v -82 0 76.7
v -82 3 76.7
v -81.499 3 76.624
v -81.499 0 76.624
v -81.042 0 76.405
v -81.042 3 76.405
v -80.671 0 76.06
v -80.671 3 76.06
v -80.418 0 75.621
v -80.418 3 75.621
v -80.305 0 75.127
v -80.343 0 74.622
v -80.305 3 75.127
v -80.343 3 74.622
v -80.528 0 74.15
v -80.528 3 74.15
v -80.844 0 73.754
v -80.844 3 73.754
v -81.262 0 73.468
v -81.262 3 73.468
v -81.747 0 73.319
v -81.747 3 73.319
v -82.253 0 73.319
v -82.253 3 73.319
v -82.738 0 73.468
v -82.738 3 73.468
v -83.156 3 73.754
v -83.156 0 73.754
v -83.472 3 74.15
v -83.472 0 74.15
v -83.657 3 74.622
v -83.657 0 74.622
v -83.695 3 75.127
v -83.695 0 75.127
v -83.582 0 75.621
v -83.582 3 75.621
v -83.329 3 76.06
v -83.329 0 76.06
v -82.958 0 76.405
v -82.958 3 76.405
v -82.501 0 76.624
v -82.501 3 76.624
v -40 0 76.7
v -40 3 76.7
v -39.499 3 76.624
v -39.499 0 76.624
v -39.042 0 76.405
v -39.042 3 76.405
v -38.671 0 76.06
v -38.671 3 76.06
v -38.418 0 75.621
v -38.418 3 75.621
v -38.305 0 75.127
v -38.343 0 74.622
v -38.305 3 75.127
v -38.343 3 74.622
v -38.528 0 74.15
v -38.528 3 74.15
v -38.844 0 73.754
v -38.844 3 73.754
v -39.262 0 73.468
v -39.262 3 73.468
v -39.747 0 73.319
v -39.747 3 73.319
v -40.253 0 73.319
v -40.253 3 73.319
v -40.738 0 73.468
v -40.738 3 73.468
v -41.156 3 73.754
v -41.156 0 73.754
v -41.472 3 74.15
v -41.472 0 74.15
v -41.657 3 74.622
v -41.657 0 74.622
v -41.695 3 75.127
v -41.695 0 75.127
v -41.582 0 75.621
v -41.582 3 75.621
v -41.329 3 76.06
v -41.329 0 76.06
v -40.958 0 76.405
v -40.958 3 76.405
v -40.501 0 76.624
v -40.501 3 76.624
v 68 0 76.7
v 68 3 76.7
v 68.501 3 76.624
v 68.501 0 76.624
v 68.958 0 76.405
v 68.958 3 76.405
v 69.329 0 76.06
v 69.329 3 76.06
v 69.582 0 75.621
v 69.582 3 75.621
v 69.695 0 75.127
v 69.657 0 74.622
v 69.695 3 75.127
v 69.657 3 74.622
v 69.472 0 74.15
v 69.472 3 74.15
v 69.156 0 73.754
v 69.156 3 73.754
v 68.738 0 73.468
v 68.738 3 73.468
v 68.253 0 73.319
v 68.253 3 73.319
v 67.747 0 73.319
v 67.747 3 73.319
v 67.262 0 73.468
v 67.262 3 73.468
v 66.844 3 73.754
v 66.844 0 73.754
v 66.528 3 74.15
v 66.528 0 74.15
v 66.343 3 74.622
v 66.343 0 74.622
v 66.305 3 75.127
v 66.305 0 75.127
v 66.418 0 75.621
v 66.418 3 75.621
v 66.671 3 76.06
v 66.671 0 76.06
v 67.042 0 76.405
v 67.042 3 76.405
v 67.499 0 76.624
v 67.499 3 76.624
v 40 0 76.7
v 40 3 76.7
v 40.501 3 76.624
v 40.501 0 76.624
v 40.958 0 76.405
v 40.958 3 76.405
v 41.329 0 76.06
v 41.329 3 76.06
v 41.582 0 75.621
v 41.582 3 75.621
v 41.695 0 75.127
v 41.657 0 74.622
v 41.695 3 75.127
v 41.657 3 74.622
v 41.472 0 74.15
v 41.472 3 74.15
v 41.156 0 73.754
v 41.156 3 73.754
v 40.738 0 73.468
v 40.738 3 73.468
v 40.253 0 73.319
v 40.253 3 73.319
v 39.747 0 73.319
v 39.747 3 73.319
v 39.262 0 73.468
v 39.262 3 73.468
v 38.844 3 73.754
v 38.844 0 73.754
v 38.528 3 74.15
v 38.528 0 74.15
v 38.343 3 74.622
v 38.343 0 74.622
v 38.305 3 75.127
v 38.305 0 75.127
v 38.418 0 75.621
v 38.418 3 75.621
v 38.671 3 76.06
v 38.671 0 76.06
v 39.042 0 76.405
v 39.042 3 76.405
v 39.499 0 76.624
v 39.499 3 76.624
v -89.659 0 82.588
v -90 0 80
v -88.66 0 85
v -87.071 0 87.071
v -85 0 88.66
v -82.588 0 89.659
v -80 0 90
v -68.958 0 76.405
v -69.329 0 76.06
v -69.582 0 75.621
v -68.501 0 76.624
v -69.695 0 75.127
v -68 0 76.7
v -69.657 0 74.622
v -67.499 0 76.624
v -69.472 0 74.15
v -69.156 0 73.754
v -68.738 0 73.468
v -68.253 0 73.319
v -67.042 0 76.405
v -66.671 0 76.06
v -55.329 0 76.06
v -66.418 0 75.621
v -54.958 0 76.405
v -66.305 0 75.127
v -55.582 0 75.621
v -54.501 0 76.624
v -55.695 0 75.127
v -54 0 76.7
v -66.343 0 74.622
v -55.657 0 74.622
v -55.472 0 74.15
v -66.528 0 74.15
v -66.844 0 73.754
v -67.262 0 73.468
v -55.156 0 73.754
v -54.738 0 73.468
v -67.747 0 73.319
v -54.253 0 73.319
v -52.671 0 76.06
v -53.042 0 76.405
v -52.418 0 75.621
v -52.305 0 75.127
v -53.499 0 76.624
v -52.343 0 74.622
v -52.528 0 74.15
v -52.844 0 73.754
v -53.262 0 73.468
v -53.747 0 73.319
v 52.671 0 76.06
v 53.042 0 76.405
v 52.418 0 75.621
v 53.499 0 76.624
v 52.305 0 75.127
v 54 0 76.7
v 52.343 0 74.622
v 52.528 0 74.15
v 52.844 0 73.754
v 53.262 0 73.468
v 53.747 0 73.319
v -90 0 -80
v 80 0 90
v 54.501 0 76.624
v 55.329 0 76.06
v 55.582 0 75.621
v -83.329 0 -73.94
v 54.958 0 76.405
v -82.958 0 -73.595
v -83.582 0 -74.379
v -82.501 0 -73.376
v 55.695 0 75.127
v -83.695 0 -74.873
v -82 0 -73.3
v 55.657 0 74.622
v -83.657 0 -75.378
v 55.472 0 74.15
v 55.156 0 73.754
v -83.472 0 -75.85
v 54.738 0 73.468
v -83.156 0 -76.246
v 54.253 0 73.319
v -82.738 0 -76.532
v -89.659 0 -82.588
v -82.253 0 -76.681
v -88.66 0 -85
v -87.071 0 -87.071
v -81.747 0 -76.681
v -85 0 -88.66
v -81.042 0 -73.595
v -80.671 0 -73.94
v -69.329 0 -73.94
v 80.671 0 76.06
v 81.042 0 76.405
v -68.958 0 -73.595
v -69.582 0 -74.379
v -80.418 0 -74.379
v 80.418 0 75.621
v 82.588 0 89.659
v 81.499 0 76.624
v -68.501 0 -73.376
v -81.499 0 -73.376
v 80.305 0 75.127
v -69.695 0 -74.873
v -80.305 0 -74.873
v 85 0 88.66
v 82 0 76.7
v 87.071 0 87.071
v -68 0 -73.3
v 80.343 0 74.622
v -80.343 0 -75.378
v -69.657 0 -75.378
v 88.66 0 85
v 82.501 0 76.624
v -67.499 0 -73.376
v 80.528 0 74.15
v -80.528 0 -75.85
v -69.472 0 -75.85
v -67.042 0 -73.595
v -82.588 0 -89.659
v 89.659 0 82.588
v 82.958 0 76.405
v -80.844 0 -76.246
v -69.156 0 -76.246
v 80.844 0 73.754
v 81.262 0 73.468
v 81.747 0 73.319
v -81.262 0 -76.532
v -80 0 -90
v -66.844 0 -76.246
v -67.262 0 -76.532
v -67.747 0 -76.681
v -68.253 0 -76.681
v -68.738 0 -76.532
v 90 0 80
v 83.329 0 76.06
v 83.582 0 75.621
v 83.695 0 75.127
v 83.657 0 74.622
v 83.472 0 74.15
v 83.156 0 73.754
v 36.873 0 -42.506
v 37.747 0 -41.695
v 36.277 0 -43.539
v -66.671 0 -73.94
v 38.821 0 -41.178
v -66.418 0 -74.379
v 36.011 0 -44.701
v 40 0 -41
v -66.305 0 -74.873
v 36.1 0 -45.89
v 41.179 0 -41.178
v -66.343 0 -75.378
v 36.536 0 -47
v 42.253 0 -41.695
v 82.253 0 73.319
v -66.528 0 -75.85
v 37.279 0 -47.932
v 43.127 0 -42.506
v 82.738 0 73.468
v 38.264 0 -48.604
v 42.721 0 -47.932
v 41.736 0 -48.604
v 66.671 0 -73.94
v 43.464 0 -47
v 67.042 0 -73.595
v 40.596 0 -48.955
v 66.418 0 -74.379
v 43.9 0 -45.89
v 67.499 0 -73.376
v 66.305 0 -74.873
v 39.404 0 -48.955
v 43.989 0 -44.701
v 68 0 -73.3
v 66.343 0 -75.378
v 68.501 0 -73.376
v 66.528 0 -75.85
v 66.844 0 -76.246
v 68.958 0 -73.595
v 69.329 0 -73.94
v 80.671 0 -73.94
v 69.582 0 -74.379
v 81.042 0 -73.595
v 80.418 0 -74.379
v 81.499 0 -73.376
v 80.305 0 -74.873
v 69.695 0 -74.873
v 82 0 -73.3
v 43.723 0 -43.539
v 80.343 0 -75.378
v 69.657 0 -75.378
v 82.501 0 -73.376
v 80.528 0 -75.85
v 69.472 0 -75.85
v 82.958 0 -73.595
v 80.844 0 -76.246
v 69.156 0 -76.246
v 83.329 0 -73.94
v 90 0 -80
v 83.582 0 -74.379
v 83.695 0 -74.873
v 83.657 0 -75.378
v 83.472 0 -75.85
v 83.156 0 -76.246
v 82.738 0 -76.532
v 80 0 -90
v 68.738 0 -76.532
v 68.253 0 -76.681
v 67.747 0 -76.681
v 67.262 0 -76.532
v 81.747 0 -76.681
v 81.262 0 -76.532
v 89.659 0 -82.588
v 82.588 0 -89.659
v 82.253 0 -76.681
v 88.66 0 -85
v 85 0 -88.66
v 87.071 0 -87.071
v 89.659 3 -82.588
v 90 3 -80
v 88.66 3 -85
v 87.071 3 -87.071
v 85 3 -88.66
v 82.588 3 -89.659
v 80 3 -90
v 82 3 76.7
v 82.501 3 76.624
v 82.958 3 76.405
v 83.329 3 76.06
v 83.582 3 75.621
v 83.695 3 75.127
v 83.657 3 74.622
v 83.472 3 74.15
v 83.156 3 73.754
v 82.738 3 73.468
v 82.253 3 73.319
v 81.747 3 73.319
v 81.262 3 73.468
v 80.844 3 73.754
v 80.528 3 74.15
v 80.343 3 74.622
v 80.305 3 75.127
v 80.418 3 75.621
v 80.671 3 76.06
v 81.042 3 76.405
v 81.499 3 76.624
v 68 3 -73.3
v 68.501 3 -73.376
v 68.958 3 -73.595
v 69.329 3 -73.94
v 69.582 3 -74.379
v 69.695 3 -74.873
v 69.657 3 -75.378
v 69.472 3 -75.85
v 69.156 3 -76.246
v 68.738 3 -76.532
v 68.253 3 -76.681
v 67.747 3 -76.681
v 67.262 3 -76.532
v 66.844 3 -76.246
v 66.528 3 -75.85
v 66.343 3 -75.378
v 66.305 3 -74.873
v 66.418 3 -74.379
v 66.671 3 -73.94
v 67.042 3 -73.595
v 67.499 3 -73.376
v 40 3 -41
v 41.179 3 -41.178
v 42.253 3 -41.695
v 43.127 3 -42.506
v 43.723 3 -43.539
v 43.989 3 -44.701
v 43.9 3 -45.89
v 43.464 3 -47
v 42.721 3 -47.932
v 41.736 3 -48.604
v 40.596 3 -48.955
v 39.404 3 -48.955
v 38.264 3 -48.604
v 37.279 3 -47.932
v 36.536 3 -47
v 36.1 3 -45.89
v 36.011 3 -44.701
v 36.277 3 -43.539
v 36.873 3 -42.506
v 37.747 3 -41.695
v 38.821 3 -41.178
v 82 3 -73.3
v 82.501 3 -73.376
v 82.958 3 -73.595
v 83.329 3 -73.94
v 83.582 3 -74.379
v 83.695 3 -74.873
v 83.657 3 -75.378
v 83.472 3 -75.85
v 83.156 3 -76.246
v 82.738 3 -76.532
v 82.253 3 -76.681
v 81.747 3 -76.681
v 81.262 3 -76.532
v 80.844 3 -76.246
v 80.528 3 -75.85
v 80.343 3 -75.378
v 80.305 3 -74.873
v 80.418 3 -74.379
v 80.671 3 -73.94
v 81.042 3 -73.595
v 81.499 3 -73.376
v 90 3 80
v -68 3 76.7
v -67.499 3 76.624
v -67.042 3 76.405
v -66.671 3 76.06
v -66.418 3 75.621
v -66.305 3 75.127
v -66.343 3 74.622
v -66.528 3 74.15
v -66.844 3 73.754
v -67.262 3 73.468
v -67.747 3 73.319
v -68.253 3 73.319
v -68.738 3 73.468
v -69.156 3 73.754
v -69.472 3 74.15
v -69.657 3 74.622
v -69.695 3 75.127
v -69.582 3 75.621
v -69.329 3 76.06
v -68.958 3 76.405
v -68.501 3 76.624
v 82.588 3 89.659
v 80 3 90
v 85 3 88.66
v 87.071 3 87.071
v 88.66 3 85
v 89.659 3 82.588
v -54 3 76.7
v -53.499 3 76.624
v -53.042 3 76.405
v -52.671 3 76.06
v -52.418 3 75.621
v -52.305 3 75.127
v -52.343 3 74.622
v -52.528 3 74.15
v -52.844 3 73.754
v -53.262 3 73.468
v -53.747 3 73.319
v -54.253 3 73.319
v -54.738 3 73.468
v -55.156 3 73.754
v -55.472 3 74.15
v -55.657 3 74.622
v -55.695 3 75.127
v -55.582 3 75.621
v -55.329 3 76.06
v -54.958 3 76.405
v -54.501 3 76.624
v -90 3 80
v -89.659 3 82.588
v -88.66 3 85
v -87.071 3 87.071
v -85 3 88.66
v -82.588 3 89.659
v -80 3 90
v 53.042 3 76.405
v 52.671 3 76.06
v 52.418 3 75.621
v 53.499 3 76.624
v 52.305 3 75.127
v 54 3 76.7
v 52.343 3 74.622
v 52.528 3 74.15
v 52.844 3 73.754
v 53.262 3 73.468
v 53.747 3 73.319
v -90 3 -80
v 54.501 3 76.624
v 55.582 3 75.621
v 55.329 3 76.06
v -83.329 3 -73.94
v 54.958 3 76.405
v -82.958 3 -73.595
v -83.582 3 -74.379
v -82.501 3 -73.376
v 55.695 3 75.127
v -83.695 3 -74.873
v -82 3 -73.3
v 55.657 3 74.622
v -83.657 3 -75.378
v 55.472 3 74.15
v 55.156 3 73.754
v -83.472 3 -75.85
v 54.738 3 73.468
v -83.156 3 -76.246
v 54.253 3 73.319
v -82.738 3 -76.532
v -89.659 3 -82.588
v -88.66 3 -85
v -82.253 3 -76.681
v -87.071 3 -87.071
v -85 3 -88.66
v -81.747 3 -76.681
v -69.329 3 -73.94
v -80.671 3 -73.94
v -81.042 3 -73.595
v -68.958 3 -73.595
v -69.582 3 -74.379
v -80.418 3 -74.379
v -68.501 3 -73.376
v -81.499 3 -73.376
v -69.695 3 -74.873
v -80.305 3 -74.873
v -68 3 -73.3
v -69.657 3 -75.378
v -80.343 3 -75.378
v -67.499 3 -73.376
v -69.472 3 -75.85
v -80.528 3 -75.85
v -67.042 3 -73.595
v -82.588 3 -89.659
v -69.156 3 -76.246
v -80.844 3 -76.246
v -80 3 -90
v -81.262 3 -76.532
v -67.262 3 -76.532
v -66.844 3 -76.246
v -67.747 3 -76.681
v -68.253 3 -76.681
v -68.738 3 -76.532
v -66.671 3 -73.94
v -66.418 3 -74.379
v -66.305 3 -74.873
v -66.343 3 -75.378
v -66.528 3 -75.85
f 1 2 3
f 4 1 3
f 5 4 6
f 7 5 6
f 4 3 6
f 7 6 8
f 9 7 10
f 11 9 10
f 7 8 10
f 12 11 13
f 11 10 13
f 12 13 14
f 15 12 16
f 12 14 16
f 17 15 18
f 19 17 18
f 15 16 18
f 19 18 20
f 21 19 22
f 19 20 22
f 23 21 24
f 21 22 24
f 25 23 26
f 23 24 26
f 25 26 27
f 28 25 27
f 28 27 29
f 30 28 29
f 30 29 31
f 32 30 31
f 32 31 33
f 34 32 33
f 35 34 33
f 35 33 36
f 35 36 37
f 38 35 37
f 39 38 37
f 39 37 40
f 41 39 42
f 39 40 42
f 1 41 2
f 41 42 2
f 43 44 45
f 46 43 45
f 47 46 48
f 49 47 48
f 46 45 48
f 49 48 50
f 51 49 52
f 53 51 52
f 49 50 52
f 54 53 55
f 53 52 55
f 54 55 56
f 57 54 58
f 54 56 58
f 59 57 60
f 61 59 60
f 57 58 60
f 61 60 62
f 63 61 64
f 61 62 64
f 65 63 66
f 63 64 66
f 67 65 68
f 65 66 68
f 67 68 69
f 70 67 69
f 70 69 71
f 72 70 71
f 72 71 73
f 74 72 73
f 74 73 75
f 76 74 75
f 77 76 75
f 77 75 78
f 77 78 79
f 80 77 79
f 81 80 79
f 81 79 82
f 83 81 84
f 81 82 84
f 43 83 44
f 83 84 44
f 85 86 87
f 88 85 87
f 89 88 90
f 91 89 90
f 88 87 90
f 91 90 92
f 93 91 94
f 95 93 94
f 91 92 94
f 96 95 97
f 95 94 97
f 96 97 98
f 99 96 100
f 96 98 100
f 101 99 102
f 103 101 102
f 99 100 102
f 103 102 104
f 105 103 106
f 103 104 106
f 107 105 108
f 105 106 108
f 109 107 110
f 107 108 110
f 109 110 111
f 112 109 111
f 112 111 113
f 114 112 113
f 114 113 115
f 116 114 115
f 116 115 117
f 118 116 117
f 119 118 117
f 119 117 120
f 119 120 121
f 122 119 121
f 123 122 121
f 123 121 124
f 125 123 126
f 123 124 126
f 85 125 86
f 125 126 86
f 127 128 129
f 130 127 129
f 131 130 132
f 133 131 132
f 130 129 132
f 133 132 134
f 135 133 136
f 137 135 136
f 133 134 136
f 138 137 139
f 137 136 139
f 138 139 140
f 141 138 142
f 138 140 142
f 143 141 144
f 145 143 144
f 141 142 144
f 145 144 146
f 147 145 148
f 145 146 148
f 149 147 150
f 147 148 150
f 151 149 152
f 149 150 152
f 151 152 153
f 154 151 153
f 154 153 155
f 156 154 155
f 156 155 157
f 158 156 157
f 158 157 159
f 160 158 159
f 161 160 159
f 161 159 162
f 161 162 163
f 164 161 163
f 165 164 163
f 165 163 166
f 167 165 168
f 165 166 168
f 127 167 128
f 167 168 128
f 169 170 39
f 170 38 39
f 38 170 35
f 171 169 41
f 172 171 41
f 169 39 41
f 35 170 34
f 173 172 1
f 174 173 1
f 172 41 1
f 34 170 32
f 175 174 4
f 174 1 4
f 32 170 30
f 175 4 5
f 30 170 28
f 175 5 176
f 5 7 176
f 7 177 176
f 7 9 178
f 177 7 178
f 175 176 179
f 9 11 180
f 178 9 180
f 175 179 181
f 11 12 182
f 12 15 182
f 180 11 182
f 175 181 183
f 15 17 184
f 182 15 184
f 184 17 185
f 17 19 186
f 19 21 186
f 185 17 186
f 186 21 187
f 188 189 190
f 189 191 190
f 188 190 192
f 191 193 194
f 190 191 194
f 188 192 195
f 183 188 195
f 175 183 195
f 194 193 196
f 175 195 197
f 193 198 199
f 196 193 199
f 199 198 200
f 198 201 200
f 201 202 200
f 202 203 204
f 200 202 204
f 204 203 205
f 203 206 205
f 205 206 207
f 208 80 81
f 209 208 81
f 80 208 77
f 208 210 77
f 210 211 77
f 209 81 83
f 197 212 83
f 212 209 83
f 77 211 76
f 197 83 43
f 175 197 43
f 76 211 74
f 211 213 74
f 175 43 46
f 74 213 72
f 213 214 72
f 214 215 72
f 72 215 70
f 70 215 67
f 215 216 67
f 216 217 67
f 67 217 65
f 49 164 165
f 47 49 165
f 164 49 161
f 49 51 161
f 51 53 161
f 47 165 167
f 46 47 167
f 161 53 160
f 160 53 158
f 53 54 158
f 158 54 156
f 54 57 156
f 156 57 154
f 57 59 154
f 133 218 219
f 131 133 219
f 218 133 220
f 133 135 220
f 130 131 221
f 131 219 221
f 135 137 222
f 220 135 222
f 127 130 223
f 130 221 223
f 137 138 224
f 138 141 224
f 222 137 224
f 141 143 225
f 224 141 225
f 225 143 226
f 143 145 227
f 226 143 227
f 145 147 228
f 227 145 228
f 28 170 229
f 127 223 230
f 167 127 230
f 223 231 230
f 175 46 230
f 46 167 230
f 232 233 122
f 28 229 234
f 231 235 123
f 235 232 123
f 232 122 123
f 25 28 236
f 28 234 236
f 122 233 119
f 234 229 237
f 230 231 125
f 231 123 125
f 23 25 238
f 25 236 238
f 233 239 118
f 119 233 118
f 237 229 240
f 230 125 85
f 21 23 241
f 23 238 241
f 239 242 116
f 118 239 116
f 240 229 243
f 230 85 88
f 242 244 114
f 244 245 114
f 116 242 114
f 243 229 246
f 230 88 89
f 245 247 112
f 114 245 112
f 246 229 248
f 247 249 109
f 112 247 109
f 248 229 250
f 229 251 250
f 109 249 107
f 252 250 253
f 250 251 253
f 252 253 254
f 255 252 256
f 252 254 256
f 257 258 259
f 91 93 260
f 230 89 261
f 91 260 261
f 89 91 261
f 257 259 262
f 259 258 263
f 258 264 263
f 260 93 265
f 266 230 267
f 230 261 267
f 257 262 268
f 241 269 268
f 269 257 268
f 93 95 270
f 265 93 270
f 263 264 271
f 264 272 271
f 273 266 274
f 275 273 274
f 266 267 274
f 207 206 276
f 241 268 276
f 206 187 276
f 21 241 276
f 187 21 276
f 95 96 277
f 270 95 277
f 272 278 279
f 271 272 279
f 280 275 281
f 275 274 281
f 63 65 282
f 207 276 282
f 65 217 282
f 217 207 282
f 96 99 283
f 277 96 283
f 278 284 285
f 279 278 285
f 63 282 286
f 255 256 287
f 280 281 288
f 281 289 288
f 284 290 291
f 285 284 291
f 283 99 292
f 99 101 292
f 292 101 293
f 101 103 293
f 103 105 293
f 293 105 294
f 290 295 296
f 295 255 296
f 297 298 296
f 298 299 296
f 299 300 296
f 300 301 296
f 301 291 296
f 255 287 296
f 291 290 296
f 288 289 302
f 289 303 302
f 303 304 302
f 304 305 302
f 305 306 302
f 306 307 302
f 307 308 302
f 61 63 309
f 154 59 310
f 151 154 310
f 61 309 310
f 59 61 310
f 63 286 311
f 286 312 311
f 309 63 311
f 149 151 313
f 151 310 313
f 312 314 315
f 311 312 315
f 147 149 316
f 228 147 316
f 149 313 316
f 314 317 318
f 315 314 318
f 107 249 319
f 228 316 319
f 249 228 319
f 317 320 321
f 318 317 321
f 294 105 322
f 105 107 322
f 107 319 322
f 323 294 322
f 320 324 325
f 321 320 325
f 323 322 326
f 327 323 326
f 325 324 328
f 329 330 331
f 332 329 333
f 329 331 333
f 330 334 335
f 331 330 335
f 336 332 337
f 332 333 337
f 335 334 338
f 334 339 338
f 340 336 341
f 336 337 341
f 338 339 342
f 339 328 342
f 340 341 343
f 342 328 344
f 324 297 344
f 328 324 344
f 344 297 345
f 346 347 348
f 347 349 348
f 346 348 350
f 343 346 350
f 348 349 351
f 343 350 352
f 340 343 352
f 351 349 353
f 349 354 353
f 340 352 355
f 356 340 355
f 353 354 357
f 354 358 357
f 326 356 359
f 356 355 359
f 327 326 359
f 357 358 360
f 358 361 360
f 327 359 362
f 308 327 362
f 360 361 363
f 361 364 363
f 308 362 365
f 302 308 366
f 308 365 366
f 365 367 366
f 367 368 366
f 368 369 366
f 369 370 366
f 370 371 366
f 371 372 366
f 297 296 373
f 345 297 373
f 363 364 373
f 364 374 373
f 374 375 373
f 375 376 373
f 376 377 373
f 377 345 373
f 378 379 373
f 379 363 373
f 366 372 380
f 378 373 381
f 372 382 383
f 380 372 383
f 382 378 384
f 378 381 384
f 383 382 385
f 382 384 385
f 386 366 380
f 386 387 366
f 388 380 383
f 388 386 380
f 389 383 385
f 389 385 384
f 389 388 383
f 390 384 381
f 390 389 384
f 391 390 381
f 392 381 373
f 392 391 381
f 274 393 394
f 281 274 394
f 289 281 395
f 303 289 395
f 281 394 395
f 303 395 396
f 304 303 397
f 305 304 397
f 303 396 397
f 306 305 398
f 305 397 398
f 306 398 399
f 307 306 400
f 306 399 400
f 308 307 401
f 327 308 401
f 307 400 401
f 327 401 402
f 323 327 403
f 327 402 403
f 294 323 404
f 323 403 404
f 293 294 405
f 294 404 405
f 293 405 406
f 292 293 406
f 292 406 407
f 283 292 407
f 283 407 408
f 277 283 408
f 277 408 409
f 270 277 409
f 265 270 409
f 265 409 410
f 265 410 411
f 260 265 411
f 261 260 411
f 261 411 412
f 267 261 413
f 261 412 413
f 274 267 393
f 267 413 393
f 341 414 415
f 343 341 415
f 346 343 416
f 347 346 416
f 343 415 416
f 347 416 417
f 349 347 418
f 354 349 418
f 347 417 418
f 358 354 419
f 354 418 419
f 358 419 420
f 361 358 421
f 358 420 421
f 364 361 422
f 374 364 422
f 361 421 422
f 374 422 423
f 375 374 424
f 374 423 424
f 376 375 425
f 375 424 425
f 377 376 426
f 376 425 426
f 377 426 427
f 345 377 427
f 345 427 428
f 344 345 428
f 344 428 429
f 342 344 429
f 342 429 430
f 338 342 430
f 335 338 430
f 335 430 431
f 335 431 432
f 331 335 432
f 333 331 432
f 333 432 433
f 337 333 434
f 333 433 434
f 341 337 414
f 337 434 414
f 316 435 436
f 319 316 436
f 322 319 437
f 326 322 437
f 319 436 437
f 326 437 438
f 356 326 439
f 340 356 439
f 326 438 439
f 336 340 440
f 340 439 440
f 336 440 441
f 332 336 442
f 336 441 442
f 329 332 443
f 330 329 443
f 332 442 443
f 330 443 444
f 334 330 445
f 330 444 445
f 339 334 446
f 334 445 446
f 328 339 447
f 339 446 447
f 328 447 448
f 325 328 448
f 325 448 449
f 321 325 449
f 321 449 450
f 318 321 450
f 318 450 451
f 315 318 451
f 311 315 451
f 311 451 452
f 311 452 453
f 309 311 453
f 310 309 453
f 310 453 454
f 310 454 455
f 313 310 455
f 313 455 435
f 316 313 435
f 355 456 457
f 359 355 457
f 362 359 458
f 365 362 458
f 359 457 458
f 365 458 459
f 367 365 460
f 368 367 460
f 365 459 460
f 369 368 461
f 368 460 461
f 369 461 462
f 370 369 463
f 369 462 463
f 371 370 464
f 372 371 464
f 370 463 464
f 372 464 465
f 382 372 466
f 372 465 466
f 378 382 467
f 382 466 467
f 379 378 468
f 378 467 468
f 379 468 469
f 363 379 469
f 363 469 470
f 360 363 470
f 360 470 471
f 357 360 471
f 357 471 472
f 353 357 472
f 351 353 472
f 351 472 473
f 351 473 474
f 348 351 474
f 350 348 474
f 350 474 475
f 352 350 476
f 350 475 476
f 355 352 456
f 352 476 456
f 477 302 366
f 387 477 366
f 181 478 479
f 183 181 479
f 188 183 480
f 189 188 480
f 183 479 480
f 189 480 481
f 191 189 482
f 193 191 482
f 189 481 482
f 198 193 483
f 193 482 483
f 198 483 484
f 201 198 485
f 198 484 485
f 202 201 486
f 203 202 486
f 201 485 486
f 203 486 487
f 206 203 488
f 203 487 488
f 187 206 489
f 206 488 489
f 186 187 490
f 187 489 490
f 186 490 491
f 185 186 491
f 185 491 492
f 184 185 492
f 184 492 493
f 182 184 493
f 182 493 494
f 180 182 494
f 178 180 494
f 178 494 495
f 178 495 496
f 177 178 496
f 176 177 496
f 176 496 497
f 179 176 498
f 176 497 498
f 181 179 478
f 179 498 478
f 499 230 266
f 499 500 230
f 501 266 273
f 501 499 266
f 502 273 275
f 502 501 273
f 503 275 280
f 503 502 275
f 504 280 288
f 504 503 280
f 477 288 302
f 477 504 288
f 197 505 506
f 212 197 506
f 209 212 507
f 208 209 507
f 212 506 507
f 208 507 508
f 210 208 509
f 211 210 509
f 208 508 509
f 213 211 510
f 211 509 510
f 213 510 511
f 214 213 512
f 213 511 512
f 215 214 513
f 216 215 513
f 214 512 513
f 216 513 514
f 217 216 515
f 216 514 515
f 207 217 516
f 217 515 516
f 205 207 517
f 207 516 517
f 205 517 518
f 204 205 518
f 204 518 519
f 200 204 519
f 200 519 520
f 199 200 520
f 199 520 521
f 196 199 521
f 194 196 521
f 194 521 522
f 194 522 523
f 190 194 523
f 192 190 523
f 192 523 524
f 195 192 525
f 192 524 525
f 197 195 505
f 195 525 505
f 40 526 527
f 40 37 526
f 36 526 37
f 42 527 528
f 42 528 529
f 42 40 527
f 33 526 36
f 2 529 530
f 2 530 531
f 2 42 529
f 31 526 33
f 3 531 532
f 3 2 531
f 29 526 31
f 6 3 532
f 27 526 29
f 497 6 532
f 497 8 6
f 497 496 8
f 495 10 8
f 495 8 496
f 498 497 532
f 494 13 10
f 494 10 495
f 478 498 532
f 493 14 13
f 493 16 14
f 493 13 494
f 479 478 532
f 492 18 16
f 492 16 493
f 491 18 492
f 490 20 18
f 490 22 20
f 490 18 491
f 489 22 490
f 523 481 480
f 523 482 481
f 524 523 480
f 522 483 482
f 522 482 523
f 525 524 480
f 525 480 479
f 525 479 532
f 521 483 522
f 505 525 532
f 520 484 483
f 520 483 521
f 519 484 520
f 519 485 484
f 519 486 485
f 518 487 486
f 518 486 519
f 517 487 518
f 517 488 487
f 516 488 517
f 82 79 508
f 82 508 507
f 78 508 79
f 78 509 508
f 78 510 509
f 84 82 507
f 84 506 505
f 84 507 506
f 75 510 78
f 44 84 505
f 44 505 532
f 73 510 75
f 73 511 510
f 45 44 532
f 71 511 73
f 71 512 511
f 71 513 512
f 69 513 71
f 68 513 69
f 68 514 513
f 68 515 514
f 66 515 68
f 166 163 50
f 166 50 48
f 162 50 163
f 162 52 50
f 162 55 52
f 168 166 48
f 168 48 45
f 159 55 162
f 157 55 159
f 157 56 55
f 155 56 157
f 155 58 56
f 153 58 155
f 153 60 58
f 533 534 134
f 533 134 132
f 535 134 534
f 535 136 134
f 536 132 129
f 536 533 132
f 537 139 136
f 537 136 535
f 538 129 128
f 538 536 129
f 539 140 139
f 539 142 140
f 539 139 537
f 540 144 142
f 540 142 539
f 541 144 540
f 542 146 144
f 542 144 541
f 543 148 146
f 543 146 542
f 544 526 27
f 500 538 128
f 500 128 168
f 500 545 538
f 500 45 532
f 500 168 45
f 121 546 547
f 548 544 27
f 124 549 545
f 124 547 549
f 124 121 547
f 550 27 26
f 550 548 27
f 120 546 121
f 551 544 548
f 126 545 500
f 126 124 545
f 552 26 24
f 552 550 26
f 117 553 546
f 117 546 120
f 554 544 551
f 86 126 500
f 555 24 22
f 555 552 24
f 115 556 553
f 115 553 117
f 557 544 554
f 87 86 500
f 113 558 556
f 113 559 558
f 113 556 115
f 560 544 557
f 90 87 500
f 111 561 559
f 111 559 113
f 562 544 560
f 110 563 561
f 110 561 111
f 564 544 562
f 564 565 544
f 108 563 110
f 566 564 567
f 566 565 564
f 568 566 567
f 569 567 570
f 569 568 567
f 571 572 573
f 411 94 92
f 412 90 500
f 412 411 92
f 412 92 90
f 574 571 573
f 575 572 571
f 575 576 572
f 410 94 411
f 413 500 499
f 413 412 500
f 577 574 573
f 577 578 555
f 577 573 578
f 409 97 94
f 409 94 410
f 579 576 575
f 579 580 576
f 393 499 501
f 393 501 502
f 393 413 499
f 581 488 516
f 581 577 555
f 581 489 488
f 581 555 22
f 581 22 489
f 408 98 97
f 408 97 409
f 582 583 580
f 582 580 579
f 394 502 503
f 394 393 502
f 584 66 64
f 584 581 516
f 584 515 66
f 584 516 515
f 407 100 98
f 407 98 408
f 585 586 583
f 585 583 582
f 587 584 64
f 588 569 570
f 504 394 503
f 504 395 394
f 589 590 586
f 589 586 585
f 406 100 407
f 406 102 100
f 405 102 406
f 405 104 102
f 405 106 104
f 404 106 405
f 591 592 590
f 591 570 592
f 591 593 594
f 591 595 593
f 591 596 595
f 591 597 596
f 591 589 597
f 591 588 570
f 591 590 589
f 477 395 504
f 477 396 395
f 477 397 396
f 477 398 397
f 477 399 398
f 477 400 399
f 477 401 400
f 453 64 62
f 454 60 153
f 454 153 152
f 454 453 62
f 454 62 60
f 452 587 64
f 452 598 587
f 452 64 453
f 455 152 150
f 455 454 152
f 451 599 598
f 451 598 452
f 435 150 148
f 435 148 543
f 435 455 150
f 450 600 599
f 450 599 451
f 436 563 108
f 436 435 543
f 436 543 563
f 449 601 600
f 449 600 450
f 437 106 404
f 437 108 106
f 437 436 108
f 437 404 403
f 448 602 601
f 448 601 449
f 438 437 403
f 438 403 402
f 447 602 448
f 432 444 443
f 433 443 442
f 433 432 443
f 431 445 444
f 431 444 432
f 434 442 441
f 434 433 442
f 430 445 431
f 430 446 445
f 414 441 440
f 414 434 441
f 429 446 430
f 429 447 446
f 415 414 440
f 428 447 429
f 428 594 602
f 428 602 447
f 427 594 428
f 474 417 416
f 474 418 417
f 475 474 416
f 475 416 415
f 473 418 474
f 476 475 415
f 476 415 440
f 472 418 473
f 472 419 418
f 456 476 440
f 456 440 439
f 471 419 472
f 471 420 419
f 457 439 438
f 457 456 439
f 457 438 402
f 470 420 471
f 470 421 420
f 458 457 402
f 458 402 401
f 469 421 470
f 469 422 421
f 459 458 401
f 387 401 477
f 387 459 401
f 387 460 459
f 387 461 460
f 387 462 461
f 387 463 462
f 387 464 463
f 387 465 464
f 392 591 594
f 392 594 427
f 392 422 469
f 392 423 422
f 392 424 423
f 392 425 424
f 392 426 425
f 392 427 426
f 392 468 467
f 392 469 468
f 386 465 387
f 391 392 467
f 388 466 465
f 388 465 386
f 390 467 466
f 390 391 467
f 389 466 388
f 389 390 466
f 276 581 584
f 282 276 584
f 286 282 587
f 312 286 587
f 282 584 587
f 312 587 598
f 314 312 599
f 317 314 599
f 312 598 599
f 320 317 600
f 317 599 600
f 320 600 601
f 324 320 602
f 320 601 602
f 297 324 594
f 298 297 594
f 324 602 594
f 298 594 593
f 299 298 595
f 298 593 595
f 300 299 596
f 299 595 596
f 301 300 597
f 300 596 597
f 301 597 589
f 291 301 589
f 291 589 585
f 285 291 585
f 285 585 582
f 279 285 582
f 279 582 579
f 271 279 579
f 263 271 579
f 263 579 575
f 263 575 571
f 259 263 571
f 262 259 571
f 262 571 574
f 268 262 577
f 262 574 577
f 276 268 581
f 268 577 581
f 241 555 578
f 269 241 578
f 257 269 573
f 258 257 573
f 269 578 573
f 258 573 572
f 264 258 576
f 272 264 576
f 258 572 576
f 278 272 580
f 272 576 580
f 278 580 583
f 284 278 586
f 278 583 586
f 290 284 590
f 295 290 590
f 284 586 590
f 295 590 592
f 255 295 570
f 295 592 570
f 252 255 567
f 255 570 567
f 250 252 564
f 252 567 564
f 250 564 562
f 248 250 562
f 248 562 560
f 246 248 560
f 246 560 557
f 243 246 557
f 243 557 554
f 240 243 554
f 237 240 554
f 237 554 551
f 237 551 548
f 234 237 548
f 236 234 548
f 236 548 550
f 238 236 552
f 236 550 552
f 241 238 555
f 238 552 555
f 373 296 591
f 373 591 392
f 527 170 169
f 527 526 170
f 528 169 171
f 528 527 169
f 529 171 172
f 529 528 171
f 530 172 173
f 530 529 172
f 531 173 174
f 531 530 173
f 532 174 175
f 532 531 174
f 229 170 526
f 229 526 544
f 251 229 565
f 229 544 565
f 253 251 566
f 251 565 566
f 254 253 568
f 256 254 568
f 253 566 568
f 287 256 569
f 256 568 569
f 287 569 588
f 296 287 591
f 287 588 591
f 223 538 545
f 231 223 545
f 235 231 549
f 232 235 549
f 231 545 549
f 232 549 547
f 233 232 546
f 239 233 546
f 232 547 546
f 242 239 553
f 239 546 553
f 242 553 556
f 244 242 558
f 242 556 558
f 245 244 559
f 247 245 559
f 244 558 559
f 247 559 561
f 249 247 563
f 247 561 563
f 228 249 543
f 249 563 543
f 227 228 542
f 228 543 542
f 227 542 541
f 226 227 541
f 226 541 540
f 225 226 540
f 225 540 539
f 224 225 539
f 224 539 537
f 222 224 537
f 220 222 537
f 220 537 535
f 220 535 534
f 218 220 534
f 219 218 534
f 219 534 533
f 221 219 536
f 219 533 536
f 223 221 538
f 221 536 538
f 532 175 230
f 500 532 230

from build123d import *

# Parameters (mm, degrees)
SKETCH1_W           = 180
SKETCH1_H           = 180
BOSS_EXTRUDE1_DEPTH = 3
FILLET1_R           = 10
SKETCH2_R           = 1.7
CUT_EXTRUDE1_DEPTH  = 3
SKETCH3_R           = 4
CUT_EXTRUDE2_DEPTH  = 128.314571044


with BuildPart() as part:
    # Sketch1 → Boss-Extrude1 (new body)
    with BuildSketch(Plane(origin=(0, 0, 0), x_dir=(1, 0, 0), z_dir=(0, 1, 0))):
        Rectangle(SKETCH1_W, SKETCH1_H)
    extrude(amount=BOSS_EXTRUDE1_DEPTH)

    # Fillet1
    fillet1_edges = [part.edges().sort_by_distance(p)[0] for p in [
        (90, 1.5, 90),
        (-90, 1.5, 90),
        (-90, 1.5, -90),
        (90, 1.5, -90),
    ]]
    fillet(fillet1_edges, radius=FILLET1_R)

    # Sketch2 → Cut-Extrude1 (cut)
    with BuildSketch(Plane(origin=(0, 3, 0), x_dir=(1, 0, 0), z_dir=(0, 1, 0))):
        with Locations(Location((-82, 75, 0), (0, 0, 270))):
            Circle(SKETCH2_R)
        with Locations(Location((-68, 75, 0), (0, 0, 270))):
            Circle(SKETCH2_R)
        with Locations(Location((68, 75, 0), (0, 0, 270))):
            Circle(SKETCH2_R)
        with Locations(Location((82, 75, 0), (0, 0, 270))):
            Circle(SKETCH2_R)
        with Locations(Location((-82, -75, 0), (0, 0, 270))):
            Circle(SKETCH2_R)
        with Locations(Location((-68, -75, 0), (0, 0, 270))):
            Circle(SKETCH2_R)
        with Locations(Location((68, -75, 0), (0, 0, 270))):
            Circle(SKETCH2_R)
        with Locations(Location((82, -75, 0), (0, 0, 270))):
            Circle(SKETCH2_R)
        with Locations(Location((-54, -75, 0), (0, 0, 270))):
            Circle(SKETCH2_R)
        with Locations(Location((54, -75, 0), (0, 0, 270))):
            Circle(SKETCH2_R)
        with Locations(Location((-40, -75, 0), (0, 0, 270))):
            Circle(SKETCH2_R)
        with Locations(Location((40, -75, 0), (0, 0, 270))):
            Circle(SKETCH2_R)
    extrude(amount=-CUT_EXTRUDE1_DEPTH, mode=Mode.SUBTRACT)

    # Sketch3 → Cut-Extrude2 (cut, through all)
    with BuildSketch(Plane(origin=(0, 3, 0), x_dir=(1, 0, 0), z_dir=(0, 1, 0))):
        with Locations(Location((40, 45, 0), (0, 0, 270))):
            Circle(SKETCH3_R)
    extrude(amount=-CUT_EXTRUDE2_DEPTH, mode=Mode.SUBTRACT)


solid = part.part
